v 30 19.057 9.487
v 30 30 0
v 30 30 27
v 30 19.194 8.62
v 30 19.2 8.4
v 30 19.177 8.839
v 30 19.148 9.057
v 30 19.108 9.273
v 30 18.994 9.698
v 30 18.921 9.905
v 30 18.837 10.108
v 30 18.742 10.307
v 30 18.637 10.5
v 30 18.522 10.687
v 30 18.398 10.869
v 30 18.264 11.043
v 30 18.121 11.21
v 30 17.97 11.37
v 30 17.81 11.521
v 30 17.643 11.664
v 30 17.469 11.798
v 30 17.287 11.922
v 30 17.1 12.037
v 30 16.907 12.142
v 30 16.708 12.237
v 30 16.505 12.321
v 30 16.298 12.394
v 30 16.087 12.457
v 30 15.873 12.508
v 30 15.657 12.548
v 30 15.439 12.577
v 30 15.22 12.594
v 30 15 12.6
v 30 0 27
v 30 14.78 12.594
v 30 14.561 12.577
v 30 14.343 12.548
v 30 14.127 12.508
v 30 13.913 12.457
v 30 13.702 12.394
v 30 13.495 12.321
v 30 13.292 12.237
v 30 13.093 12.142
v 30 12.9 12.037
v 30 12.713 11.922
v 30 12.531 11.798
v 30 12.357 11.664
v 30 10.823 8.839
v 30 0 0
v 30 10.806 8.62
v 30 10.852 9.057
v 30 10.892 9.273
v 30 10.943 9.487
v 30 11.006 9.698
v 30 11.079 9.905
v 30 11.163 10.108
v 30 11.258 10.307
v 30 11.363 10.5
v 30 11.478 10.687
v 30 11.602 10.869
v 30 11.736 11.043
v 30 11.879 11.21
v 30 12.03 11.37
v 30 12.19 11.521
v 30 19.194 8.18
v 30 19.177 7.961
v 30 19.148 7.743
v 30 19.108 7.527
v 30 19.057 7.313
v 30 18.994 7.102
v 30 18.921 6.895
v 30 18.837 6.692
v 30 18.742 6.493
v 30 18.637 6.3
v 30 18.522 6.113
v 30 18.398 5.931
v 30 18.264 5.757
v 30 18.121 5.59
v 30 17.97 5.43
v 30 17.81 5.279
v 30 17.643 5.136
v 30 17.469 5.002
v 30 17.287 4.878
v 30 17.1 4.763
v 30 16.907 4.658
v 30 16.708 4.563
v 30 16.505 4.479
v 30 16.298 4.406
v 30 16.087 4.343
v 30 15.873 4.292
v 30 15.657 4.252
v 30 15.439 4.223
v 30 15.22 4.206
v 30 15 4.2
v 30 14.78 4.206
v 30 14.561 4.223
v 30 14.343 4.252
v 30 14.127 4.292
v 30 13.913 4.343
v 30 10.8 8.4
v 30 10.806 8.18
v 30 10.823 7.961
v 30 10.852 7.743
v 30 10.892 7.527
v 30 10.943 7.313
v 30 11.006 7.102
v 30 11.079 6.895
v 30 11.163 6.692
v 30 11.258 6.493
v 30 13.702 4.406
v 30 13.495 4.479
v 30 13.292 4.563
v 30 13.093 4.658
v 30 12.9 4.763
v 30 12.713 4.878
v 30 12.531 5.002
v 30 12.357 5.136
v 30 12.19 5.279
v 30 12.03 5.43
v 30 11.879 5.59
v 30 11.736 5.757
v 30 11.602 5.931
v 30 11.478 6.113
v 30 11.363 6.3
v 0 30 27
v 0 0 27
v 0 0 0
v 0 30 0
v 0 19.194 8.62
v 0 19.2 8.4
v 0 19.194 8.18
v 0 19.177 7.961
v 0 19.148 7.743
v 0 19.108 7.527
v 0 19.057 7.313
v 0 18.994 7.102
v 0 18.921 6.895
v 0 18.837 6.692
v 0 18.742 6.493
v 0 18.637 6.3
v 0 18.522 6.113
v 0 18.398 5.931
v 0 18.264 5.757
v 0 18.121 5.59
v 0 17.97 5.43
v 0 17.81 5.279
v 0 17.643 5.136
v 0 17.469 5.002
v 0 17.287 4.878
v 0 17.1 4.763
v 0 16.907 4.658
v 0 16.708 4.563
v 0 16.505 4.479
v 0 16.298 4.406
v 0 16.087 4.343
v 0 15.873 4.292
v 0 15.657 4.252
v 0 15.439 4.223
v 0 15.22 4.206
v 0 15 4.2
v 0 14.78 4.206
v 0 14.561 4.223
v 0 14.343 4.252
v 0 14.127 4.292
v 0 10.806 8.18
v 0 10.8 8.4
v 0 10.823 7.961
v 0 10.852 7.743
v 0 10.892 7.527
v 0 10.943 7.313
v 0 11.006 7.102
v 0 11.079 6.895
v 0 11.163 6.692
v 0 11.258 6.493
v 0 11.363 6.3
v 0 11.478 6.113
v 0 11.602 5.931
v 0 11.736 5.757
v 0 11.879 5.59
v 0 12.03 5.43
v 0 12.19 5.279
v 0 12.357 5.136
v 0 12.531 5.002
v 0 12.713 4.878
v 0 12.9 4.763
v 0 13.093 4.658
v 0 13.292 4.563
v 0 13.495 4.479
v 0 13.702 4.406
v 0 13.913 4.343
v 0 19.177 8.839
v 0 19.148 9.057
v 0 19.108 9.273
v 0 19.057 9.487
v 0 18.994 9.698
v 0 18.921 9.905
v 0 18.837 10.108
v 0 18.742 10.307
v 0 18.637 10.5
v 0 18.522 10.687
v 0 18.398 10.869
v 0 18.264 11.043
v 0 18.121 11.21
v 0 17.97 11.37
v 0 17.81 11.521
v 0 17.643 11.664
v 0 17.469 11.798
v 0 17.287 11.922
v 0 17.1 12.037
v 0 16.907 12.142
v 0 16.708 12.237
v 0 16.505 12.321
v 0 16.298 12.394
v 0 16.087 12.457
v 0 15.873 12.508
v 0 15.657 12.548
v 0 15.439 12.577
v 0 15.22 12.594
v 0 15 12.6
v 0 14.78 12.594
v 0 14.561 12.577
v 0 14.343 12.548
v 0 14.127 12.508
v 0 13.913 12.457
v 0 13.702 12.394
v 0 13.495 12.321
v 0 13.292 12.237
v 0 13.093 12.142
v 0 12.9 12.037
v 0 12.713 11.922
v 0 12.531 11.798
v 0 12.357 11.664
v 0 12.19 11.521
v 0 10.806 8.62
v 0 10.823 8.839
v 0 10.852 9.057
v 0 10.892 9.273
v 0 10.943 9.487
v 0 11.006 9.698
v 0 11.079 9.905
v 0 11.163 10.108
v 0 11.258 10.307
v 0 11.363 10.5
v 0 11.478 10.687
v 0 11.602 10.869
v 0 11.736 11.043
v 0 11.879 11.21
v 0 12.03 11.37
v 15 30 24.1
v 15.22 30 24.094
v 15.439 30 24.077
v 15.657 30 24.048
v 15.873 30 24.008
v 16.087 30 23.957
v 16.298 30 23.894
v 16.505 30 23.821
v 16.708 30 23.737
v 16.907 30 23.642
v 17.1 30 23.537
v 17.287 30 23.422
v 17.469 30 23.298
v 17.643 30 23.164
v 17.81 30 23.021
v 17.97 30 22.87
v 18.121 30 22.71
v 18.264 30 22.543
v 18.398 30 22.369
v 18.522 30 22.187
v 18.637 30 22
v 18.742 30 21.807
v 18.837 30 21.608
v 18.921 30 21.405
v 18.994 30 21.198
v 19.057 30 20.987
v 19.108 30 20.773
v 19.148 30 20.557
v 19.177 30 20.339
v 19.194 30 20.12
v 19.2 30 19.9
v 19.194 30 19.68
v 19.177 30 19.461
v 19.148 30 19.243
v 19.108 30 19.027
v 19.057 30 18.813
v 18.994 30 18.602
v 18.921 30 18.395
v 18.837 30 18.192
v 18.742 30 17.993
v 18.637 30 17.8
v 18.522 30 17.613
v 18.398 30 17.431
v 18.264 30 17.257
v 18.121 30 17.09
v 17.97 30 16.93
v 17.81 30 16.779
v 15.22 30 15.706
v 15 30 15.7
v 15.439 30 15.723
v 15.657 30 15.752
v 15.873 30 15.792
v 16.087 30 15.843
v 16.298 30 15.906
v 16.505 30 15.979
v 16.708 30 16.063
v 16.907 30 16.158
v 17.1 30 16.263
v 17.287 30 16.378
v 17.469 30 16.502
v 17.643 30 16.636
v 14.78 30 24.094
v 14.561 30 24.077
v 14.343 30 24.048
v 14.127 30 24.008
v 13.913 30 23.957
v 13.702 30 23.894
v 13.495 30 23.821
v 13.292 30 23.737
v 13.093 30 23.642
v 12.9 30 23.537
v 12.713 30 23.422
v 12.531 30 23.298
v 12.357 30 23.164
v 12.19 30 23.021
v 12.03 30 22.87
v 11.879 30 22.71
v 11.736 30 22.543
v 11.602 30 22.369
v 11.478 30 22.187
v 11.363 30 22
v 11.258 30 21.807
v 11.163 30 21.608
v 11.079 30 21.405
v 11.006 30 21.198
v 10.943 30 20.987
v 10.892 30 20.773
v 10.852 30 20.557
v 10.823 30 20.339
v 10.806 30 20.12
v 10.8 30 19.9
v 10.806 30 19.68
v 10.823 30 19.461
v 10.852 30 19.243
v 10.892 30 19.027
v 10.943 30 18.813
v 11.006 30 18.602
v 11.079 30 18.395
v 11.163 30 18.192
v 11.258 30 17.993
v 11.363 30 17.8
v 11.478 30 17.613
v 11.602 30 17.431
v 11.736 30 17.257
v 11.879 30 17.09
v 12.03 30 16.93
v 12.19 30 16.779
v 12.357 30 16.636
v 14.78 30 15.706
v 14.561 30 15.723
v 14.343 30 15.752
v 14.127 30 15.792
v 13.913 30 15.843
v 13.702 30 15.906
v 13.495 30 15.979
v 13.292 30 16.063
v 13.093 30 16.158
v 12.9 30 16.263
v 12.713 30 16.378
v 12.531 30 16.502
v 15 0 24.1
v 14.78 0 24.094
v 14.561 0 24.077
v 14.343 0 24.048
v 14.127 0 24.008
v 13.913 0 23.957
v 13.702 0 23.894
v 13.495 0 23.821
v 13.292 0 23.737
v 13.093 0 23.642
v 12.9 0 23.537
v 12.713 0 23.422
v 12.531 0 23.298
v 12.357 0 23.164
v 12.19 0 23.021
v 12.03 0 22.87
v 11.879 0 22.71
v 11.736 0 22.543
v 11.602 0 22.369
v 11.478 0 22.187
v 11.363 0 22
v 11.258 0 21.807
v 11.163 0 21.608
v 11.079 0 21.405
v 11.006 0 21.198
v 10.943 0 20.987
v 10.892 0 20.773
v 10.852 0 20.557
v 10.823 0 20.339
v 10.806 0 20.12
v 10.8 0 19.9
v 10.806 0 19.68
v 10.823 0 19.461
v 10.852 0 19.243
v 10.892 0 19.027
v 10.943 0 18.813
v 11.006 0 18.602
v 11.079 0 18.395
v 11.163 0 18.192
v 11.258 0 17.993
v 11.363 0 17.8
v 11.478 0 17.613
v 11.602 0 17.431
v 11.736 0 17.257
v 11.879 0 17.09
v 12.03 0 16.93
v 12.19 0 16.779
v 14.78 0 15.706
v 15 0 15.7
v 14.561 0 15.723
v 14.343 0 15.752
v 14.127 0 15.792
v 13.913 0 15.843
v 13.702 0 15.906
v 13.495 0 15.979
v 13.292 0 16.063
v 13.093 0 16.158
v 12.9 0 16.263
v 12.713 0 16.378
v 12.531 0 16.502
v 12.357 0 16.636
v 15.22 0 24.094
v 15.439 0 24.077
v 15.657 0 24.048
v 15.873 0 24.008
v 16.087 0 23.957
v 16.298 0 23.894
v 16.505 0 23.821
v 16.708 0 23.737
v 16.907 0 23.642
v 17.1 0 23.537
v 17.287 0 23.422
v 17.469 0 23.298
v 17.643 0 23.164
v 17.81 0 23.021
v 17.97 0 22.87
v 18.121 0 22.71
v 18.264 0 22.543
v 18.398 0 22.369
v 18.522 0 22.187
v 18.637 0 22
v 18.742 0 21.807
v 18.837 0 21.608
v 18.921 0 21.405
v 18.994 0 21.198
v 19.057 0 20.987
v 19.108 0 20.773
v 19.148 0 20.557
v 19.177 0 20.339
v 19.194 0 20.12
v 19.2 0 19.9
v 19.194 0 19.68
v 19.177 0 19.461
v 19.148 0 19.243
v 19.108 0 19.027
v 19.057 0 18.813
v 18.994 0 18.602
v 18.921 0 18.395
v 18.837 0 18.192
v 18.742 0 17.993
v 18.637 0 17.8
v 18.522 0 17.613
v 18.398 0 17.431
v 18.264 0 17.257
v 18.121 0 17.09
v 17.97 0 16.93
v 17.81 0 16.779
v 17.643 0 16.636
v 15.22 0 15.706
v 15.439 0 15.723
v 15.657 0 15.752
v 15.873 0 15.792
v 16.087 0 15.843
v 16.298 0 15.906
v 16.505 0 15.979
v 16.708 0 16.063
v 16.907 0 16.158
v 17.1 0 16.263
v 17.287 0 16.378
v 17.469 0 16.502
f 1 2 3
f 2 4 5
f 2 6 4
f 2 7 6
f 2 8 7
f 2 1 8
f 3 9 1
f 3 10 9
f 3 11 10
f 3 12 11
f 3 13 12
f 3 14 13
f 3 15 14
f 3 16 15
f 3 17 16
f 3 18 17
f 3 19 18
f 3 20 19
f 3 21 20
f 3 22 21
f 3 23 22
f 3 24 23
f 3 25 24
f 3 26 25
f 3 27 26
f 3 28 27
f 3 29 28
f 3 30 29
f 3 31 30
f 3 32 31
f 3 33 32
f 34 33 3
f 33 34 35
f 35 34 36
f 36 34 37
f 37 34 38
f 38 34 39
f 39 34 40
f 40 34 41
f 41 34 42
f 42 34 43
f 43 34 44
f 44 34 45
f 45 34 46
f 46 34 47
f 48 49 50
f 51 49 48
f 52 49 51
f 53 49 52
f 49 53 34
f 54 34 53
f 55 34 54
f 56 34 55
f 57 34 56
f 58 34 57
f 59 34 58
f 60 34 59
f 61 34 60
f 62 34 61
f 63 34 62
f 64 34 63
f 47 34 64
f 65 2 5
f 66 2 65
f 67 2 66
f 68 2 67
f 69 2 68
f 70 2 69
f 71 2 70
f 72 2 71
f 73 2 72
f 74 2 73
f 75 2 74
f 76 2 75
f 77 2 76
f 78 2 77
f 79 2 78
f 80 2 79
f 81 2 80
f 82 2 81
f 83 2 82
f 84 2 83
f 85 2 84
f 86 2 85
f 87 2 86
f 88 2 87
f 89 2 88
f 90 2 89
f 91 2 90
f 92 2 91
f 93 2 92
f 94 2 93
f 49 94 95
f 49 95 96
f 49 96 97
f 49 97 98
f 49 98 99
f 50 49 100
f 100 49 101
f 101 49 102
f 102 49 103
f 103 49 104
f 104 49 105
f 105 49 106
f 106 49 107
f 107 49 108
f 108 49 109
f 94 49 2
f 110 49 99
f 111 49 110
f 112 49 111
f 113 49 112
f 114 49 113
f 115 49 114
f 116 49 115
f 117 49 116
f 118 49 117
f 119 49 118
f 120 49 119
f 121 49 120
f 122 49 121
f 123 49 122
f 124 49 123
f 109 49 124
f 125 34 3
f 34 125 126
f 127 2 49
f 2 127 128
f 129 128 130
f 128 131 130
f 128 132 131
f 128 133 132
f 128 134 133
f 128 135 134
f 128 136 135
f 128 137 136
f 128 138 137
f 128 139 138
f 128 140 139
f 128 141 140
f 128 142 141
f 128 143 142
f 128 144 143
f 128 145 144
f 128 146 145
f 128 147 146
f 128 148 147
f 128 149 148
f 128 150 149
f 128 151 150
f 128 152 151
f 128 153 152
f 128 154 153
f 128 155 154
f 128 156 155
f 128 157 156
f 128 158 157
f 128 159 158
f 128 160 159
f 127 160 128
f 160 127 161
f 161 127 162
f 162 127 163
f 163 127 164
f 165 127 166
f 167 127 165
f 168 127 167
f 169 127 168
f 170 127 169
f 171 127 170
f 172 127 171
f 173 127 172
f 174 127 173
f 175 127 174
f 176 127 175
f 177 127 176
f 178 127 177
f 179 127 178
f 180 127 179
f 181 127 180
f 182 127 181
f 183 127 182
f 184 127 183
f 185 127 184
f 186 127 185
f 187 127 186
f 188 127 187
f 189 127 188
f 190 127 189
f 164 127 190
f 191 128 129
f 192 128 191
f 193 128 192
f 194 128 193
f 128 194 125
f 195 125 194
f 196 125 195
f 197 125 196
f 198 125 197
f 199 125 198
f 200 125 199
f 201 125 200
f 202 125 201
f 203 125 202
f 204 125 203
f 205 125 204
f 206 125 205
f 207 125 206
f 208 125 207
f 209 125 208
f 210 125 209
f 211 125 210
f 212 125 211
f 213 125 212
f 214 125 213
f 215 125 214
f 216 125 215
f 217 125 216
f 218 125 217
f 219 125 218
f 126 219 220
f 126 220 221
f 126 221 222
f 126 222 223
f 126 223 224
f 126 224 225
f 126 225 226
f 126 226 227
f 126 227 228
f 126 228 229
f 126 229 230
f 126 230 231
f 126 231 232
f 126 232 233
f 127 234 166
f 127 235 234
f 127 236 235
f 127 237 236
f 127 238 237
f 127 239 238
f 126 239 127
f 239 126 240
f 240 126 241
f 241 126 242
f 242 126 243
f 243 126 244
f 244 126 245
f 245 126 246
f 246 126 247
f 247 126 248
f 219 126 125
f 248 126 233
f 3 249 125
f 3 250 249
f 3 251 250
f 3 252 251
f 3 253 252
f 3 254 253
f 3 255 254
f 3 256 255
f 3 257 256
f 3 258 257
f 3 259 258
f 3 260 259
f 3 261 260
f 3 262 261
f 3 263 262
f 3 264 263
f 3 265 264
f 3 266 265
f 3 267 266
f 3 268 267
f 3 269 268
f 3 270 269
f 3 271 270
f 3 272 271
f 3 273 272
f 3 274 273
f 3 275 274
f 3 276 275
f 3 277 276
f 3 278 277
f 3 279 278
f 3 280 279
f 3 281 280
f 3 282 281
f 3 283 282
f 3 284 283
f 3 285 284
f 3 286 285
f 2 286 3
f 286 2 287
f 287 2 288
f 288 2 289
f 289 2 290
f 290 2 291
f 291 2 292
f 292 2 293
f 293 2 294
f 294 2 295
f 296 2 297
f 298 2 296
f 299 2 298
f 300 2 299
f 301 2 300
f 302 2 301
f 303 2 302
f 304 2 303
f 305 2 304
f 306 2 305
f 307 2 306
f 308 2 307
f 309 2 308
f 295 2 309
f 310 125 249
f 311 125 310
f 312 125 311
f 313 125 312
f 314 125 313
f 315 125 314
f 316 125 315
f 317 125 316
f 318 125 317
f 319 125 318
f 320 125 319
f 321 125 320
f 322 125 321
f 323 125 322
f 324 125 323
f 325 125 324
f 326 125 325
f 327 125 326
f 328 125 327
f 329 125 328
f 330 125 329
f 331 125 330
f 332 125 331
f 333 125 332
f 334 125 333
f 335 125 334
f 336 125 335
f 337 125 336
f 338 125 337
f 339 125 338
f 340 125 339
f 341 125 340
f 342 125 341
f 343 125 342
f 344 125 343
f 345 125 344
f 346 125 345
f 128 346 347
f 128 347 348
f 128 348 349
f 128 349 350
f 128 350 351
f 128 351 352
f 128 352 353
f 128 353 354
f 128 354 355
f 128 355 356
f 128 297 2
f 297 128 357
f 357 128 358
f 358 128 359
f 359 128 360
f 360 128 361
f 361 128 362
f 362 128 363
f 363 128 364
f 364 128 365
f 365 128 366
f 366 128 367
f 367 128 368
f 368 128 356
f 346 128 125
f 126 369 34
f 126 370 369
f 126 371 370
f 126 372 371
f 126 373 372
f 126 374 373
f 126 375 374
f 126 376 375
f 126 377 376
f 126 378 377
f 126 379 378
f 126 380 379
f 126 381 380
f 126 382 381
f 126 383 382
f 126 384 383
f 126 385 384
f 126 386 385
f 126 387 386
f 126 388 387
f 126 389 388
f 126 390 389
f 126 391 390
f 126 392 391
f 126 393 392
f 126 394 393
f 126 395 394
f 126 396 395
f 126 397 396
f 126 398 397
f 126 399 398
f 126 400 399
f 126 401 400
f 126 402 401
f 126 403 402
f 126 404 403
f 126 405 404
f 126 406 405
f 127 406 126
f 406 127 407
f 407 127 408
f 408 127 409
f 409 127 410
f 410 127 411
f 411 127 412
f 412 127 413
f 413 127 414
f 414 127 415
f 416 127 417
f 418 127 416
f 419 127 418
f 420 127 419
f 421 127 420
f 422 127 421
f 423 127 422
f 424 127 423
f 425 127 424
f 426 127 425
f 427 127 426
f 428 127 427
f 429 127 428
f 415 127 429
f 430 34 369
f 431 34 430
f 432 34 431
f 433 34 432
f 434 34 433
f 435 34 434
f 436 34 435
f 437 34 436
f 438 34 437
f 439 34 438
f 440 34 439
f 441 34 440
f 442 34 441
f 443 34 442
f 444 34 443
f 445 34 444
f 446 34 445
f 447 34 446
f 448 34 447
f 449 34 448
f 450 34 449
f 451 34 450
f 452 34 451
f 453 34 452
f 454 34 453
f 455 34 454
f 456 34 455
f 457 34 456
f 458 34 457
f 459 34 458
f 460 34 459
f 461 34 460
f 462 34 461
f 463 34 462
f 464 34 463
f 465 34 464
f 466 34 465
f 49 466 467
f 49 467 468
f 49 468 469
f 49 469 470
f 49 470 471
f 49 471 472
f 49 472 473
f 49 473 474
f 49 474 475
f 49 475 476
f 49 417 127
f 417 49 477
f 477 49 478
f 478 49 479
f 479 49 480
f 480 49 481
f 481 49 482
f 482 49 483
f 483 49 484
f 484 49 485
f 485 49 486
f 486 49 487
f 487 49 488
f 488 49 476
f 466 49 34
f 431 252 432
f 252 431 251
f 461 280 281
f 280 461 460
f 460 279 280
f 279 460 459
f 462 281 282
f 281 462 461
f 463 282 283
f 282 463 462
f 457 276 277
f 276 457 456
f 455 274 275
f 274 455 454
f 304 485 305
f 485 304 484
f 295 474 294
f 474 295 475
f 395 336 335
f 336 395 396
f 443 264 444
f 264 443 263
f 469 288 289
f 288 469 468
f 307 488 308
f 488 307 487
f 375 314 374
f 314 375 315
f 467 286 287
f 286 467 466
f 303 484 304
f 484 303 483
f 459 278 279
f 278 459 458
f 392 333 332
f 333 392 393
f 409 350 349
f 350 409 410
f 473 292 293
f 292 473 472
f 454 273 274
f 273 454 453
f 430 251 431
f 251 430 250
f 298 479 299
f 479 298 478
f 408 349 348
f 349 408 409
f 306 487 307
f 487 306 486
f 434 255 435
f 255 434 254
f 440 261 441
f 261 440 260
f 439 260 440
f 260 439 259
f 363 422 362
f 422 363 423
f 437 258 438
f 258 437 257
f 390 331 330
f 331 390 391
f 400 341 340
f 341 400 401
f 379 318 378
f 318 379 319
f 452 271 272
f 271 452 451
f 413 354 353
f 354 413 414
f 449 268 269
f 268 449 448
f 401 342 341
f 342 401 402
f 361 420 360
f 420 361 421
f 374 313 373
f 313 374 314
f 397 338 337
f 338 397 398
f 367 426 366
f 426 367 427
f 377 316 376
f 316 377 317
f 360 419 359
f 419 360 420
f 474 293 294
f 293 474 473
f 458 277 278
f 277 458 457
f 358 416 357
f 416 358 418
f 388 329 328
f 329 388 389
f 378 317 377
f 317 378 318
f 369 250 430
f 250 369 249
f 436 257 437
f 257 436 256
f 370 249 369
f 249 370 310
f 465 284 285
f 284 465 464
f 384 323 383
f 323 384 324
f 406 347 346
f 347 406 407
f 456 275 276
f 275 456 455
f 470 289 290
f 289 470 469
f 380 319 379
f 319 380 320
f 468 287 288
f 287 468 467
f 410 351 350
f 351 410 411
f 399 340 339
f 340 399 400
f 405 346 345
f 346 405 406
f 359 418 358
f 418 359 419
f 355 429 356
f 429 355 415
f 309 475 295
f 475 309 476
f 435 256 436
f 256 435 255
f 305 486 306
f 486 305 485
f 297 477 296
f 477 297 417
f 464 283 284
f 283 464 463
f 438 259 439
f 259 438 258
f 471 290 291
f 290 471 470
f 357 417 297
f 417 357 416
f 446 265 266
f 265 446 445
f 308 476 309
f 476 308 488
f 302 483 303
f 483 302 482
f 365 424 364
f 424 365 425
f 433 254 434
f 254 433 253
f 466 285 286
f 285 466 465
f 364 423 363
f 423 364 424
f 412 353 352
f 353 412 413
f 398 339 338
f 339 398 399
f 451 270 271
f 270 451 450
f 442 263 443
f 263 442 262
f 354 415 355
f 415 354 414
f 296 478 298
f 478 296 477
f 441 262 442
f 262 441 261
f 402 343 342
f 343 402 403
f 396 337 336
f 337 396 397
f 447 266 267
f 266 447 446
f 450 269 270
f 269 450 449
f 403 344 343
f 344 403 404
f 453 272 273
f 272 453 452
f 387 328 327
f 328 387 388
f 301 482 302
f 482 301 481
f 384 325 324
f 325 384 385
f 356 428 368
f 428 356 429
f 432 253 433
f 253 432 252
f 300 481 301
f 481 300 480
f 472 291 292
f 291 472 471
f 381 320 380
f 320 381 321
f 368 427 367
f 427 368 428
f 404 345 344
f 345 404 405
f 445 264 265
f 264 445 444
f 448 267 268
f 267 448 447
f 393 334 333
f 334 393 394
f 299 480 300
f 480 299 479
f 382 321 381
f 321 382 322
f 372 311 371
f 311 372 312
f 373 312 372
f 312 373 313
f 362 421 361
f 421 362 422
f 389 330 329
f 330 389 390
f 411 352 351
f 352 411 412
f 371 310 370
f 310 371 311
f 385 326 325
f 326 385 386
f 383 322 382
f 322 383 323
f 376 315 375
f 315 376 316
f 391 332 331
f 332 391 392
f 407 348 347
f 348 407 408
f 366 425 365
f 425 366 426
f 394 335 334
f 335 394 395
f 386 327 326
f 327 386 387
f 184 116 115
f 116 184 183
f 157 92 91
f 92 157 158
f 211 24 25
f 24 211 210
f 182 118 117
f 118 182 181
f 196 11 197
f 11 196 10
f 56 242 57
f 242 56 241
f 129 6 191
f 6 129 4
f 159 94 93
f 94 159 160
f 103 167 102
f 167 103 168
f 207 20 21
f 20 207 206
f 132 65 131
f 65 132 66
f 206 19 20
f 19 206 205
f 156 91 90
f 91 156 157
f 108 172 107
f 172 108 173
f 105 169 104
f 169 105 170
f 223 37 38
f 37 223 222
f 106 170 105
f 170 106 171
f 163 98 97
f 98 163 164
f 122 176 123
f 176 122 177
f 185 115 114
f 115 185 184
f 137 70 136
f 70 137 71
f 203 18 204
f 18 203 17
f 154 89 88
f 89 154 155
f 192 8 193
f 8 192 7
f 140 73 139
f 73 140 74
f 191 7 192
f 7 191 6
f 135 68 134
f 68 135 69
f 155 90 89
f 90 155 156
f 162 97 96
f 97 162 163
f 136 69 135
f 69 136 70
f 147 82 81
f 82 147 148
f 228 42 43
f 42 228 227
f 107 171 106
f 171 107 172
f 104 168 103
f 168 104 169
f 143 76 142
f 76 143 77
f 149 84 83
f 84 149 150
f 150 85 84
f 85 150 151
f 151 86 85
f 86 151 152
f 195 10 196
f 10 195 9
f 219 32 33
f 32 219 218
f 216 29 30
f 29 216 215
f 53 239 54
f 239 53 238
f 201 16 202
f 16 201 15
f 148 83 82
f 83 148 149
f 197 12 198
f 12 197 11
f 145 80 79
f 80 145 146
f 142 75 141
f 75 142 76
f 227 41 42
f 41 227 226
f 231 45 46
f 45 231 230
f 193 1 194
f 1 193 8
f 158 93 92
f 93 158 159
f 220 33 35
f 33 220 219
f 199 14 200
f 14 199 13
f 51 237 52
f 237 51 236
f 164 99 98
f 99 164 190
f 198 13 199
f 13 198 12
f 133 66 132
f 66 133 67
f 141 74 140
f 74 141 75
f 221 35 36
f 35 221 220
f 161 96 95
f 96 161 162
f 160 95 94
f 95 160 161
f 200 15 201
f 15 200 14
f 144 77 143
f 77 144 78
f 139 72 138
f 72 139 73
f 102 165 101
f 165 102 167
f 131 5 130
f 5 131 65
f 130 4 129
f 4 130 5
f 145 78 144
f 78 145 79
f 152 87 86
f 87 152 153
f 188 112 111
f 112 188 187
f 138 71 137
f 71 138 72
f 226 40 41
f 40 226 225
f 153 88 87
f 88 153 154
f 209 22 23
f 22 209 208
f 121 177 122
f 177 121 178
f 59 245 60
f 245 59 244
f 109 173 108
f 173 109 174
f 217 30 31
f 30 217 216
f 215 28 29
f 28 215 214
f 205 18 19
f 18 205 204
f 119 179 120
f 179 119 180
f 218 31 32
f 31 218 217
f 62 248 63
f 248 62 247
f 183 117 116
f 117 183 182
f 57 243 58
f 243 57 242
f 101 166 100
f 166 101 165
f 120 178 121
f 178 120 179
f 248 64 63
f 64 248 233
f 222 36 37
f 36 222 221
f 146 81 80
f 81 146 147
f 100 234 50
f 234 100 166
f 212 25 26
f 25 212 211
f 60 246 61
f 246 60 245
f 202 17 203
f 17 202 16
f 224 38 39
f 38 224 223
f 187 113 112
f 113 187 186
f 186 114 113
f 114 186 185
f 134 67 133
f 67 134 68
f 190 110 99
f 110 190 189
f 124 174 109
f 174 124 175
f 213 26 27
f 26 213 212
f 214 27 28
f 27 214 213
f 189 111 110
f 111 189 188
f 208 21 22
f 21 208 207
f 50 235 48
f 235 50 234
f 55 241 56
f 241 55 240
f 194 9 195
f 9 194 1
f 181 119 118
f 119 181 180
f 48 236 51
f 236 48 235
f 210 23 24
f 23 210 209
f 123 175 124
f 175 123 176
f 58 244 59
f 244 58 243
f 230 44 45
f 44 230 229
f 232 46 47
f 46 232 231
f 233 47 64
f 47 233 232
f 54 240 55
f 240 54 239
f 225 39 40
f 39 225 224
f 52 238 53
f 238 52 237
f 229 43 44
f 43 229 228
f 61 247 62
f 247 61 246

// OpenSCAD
$fn=120;
difference() {
    cube([30,30,27]);
    translate([15,0,19.9]) rotate([-90,0,0]) cylinder(30,d=8.4);
    translate([0,15,8.4]) rotate([0,90,0]) cylinder(30,d=8.4);
}
